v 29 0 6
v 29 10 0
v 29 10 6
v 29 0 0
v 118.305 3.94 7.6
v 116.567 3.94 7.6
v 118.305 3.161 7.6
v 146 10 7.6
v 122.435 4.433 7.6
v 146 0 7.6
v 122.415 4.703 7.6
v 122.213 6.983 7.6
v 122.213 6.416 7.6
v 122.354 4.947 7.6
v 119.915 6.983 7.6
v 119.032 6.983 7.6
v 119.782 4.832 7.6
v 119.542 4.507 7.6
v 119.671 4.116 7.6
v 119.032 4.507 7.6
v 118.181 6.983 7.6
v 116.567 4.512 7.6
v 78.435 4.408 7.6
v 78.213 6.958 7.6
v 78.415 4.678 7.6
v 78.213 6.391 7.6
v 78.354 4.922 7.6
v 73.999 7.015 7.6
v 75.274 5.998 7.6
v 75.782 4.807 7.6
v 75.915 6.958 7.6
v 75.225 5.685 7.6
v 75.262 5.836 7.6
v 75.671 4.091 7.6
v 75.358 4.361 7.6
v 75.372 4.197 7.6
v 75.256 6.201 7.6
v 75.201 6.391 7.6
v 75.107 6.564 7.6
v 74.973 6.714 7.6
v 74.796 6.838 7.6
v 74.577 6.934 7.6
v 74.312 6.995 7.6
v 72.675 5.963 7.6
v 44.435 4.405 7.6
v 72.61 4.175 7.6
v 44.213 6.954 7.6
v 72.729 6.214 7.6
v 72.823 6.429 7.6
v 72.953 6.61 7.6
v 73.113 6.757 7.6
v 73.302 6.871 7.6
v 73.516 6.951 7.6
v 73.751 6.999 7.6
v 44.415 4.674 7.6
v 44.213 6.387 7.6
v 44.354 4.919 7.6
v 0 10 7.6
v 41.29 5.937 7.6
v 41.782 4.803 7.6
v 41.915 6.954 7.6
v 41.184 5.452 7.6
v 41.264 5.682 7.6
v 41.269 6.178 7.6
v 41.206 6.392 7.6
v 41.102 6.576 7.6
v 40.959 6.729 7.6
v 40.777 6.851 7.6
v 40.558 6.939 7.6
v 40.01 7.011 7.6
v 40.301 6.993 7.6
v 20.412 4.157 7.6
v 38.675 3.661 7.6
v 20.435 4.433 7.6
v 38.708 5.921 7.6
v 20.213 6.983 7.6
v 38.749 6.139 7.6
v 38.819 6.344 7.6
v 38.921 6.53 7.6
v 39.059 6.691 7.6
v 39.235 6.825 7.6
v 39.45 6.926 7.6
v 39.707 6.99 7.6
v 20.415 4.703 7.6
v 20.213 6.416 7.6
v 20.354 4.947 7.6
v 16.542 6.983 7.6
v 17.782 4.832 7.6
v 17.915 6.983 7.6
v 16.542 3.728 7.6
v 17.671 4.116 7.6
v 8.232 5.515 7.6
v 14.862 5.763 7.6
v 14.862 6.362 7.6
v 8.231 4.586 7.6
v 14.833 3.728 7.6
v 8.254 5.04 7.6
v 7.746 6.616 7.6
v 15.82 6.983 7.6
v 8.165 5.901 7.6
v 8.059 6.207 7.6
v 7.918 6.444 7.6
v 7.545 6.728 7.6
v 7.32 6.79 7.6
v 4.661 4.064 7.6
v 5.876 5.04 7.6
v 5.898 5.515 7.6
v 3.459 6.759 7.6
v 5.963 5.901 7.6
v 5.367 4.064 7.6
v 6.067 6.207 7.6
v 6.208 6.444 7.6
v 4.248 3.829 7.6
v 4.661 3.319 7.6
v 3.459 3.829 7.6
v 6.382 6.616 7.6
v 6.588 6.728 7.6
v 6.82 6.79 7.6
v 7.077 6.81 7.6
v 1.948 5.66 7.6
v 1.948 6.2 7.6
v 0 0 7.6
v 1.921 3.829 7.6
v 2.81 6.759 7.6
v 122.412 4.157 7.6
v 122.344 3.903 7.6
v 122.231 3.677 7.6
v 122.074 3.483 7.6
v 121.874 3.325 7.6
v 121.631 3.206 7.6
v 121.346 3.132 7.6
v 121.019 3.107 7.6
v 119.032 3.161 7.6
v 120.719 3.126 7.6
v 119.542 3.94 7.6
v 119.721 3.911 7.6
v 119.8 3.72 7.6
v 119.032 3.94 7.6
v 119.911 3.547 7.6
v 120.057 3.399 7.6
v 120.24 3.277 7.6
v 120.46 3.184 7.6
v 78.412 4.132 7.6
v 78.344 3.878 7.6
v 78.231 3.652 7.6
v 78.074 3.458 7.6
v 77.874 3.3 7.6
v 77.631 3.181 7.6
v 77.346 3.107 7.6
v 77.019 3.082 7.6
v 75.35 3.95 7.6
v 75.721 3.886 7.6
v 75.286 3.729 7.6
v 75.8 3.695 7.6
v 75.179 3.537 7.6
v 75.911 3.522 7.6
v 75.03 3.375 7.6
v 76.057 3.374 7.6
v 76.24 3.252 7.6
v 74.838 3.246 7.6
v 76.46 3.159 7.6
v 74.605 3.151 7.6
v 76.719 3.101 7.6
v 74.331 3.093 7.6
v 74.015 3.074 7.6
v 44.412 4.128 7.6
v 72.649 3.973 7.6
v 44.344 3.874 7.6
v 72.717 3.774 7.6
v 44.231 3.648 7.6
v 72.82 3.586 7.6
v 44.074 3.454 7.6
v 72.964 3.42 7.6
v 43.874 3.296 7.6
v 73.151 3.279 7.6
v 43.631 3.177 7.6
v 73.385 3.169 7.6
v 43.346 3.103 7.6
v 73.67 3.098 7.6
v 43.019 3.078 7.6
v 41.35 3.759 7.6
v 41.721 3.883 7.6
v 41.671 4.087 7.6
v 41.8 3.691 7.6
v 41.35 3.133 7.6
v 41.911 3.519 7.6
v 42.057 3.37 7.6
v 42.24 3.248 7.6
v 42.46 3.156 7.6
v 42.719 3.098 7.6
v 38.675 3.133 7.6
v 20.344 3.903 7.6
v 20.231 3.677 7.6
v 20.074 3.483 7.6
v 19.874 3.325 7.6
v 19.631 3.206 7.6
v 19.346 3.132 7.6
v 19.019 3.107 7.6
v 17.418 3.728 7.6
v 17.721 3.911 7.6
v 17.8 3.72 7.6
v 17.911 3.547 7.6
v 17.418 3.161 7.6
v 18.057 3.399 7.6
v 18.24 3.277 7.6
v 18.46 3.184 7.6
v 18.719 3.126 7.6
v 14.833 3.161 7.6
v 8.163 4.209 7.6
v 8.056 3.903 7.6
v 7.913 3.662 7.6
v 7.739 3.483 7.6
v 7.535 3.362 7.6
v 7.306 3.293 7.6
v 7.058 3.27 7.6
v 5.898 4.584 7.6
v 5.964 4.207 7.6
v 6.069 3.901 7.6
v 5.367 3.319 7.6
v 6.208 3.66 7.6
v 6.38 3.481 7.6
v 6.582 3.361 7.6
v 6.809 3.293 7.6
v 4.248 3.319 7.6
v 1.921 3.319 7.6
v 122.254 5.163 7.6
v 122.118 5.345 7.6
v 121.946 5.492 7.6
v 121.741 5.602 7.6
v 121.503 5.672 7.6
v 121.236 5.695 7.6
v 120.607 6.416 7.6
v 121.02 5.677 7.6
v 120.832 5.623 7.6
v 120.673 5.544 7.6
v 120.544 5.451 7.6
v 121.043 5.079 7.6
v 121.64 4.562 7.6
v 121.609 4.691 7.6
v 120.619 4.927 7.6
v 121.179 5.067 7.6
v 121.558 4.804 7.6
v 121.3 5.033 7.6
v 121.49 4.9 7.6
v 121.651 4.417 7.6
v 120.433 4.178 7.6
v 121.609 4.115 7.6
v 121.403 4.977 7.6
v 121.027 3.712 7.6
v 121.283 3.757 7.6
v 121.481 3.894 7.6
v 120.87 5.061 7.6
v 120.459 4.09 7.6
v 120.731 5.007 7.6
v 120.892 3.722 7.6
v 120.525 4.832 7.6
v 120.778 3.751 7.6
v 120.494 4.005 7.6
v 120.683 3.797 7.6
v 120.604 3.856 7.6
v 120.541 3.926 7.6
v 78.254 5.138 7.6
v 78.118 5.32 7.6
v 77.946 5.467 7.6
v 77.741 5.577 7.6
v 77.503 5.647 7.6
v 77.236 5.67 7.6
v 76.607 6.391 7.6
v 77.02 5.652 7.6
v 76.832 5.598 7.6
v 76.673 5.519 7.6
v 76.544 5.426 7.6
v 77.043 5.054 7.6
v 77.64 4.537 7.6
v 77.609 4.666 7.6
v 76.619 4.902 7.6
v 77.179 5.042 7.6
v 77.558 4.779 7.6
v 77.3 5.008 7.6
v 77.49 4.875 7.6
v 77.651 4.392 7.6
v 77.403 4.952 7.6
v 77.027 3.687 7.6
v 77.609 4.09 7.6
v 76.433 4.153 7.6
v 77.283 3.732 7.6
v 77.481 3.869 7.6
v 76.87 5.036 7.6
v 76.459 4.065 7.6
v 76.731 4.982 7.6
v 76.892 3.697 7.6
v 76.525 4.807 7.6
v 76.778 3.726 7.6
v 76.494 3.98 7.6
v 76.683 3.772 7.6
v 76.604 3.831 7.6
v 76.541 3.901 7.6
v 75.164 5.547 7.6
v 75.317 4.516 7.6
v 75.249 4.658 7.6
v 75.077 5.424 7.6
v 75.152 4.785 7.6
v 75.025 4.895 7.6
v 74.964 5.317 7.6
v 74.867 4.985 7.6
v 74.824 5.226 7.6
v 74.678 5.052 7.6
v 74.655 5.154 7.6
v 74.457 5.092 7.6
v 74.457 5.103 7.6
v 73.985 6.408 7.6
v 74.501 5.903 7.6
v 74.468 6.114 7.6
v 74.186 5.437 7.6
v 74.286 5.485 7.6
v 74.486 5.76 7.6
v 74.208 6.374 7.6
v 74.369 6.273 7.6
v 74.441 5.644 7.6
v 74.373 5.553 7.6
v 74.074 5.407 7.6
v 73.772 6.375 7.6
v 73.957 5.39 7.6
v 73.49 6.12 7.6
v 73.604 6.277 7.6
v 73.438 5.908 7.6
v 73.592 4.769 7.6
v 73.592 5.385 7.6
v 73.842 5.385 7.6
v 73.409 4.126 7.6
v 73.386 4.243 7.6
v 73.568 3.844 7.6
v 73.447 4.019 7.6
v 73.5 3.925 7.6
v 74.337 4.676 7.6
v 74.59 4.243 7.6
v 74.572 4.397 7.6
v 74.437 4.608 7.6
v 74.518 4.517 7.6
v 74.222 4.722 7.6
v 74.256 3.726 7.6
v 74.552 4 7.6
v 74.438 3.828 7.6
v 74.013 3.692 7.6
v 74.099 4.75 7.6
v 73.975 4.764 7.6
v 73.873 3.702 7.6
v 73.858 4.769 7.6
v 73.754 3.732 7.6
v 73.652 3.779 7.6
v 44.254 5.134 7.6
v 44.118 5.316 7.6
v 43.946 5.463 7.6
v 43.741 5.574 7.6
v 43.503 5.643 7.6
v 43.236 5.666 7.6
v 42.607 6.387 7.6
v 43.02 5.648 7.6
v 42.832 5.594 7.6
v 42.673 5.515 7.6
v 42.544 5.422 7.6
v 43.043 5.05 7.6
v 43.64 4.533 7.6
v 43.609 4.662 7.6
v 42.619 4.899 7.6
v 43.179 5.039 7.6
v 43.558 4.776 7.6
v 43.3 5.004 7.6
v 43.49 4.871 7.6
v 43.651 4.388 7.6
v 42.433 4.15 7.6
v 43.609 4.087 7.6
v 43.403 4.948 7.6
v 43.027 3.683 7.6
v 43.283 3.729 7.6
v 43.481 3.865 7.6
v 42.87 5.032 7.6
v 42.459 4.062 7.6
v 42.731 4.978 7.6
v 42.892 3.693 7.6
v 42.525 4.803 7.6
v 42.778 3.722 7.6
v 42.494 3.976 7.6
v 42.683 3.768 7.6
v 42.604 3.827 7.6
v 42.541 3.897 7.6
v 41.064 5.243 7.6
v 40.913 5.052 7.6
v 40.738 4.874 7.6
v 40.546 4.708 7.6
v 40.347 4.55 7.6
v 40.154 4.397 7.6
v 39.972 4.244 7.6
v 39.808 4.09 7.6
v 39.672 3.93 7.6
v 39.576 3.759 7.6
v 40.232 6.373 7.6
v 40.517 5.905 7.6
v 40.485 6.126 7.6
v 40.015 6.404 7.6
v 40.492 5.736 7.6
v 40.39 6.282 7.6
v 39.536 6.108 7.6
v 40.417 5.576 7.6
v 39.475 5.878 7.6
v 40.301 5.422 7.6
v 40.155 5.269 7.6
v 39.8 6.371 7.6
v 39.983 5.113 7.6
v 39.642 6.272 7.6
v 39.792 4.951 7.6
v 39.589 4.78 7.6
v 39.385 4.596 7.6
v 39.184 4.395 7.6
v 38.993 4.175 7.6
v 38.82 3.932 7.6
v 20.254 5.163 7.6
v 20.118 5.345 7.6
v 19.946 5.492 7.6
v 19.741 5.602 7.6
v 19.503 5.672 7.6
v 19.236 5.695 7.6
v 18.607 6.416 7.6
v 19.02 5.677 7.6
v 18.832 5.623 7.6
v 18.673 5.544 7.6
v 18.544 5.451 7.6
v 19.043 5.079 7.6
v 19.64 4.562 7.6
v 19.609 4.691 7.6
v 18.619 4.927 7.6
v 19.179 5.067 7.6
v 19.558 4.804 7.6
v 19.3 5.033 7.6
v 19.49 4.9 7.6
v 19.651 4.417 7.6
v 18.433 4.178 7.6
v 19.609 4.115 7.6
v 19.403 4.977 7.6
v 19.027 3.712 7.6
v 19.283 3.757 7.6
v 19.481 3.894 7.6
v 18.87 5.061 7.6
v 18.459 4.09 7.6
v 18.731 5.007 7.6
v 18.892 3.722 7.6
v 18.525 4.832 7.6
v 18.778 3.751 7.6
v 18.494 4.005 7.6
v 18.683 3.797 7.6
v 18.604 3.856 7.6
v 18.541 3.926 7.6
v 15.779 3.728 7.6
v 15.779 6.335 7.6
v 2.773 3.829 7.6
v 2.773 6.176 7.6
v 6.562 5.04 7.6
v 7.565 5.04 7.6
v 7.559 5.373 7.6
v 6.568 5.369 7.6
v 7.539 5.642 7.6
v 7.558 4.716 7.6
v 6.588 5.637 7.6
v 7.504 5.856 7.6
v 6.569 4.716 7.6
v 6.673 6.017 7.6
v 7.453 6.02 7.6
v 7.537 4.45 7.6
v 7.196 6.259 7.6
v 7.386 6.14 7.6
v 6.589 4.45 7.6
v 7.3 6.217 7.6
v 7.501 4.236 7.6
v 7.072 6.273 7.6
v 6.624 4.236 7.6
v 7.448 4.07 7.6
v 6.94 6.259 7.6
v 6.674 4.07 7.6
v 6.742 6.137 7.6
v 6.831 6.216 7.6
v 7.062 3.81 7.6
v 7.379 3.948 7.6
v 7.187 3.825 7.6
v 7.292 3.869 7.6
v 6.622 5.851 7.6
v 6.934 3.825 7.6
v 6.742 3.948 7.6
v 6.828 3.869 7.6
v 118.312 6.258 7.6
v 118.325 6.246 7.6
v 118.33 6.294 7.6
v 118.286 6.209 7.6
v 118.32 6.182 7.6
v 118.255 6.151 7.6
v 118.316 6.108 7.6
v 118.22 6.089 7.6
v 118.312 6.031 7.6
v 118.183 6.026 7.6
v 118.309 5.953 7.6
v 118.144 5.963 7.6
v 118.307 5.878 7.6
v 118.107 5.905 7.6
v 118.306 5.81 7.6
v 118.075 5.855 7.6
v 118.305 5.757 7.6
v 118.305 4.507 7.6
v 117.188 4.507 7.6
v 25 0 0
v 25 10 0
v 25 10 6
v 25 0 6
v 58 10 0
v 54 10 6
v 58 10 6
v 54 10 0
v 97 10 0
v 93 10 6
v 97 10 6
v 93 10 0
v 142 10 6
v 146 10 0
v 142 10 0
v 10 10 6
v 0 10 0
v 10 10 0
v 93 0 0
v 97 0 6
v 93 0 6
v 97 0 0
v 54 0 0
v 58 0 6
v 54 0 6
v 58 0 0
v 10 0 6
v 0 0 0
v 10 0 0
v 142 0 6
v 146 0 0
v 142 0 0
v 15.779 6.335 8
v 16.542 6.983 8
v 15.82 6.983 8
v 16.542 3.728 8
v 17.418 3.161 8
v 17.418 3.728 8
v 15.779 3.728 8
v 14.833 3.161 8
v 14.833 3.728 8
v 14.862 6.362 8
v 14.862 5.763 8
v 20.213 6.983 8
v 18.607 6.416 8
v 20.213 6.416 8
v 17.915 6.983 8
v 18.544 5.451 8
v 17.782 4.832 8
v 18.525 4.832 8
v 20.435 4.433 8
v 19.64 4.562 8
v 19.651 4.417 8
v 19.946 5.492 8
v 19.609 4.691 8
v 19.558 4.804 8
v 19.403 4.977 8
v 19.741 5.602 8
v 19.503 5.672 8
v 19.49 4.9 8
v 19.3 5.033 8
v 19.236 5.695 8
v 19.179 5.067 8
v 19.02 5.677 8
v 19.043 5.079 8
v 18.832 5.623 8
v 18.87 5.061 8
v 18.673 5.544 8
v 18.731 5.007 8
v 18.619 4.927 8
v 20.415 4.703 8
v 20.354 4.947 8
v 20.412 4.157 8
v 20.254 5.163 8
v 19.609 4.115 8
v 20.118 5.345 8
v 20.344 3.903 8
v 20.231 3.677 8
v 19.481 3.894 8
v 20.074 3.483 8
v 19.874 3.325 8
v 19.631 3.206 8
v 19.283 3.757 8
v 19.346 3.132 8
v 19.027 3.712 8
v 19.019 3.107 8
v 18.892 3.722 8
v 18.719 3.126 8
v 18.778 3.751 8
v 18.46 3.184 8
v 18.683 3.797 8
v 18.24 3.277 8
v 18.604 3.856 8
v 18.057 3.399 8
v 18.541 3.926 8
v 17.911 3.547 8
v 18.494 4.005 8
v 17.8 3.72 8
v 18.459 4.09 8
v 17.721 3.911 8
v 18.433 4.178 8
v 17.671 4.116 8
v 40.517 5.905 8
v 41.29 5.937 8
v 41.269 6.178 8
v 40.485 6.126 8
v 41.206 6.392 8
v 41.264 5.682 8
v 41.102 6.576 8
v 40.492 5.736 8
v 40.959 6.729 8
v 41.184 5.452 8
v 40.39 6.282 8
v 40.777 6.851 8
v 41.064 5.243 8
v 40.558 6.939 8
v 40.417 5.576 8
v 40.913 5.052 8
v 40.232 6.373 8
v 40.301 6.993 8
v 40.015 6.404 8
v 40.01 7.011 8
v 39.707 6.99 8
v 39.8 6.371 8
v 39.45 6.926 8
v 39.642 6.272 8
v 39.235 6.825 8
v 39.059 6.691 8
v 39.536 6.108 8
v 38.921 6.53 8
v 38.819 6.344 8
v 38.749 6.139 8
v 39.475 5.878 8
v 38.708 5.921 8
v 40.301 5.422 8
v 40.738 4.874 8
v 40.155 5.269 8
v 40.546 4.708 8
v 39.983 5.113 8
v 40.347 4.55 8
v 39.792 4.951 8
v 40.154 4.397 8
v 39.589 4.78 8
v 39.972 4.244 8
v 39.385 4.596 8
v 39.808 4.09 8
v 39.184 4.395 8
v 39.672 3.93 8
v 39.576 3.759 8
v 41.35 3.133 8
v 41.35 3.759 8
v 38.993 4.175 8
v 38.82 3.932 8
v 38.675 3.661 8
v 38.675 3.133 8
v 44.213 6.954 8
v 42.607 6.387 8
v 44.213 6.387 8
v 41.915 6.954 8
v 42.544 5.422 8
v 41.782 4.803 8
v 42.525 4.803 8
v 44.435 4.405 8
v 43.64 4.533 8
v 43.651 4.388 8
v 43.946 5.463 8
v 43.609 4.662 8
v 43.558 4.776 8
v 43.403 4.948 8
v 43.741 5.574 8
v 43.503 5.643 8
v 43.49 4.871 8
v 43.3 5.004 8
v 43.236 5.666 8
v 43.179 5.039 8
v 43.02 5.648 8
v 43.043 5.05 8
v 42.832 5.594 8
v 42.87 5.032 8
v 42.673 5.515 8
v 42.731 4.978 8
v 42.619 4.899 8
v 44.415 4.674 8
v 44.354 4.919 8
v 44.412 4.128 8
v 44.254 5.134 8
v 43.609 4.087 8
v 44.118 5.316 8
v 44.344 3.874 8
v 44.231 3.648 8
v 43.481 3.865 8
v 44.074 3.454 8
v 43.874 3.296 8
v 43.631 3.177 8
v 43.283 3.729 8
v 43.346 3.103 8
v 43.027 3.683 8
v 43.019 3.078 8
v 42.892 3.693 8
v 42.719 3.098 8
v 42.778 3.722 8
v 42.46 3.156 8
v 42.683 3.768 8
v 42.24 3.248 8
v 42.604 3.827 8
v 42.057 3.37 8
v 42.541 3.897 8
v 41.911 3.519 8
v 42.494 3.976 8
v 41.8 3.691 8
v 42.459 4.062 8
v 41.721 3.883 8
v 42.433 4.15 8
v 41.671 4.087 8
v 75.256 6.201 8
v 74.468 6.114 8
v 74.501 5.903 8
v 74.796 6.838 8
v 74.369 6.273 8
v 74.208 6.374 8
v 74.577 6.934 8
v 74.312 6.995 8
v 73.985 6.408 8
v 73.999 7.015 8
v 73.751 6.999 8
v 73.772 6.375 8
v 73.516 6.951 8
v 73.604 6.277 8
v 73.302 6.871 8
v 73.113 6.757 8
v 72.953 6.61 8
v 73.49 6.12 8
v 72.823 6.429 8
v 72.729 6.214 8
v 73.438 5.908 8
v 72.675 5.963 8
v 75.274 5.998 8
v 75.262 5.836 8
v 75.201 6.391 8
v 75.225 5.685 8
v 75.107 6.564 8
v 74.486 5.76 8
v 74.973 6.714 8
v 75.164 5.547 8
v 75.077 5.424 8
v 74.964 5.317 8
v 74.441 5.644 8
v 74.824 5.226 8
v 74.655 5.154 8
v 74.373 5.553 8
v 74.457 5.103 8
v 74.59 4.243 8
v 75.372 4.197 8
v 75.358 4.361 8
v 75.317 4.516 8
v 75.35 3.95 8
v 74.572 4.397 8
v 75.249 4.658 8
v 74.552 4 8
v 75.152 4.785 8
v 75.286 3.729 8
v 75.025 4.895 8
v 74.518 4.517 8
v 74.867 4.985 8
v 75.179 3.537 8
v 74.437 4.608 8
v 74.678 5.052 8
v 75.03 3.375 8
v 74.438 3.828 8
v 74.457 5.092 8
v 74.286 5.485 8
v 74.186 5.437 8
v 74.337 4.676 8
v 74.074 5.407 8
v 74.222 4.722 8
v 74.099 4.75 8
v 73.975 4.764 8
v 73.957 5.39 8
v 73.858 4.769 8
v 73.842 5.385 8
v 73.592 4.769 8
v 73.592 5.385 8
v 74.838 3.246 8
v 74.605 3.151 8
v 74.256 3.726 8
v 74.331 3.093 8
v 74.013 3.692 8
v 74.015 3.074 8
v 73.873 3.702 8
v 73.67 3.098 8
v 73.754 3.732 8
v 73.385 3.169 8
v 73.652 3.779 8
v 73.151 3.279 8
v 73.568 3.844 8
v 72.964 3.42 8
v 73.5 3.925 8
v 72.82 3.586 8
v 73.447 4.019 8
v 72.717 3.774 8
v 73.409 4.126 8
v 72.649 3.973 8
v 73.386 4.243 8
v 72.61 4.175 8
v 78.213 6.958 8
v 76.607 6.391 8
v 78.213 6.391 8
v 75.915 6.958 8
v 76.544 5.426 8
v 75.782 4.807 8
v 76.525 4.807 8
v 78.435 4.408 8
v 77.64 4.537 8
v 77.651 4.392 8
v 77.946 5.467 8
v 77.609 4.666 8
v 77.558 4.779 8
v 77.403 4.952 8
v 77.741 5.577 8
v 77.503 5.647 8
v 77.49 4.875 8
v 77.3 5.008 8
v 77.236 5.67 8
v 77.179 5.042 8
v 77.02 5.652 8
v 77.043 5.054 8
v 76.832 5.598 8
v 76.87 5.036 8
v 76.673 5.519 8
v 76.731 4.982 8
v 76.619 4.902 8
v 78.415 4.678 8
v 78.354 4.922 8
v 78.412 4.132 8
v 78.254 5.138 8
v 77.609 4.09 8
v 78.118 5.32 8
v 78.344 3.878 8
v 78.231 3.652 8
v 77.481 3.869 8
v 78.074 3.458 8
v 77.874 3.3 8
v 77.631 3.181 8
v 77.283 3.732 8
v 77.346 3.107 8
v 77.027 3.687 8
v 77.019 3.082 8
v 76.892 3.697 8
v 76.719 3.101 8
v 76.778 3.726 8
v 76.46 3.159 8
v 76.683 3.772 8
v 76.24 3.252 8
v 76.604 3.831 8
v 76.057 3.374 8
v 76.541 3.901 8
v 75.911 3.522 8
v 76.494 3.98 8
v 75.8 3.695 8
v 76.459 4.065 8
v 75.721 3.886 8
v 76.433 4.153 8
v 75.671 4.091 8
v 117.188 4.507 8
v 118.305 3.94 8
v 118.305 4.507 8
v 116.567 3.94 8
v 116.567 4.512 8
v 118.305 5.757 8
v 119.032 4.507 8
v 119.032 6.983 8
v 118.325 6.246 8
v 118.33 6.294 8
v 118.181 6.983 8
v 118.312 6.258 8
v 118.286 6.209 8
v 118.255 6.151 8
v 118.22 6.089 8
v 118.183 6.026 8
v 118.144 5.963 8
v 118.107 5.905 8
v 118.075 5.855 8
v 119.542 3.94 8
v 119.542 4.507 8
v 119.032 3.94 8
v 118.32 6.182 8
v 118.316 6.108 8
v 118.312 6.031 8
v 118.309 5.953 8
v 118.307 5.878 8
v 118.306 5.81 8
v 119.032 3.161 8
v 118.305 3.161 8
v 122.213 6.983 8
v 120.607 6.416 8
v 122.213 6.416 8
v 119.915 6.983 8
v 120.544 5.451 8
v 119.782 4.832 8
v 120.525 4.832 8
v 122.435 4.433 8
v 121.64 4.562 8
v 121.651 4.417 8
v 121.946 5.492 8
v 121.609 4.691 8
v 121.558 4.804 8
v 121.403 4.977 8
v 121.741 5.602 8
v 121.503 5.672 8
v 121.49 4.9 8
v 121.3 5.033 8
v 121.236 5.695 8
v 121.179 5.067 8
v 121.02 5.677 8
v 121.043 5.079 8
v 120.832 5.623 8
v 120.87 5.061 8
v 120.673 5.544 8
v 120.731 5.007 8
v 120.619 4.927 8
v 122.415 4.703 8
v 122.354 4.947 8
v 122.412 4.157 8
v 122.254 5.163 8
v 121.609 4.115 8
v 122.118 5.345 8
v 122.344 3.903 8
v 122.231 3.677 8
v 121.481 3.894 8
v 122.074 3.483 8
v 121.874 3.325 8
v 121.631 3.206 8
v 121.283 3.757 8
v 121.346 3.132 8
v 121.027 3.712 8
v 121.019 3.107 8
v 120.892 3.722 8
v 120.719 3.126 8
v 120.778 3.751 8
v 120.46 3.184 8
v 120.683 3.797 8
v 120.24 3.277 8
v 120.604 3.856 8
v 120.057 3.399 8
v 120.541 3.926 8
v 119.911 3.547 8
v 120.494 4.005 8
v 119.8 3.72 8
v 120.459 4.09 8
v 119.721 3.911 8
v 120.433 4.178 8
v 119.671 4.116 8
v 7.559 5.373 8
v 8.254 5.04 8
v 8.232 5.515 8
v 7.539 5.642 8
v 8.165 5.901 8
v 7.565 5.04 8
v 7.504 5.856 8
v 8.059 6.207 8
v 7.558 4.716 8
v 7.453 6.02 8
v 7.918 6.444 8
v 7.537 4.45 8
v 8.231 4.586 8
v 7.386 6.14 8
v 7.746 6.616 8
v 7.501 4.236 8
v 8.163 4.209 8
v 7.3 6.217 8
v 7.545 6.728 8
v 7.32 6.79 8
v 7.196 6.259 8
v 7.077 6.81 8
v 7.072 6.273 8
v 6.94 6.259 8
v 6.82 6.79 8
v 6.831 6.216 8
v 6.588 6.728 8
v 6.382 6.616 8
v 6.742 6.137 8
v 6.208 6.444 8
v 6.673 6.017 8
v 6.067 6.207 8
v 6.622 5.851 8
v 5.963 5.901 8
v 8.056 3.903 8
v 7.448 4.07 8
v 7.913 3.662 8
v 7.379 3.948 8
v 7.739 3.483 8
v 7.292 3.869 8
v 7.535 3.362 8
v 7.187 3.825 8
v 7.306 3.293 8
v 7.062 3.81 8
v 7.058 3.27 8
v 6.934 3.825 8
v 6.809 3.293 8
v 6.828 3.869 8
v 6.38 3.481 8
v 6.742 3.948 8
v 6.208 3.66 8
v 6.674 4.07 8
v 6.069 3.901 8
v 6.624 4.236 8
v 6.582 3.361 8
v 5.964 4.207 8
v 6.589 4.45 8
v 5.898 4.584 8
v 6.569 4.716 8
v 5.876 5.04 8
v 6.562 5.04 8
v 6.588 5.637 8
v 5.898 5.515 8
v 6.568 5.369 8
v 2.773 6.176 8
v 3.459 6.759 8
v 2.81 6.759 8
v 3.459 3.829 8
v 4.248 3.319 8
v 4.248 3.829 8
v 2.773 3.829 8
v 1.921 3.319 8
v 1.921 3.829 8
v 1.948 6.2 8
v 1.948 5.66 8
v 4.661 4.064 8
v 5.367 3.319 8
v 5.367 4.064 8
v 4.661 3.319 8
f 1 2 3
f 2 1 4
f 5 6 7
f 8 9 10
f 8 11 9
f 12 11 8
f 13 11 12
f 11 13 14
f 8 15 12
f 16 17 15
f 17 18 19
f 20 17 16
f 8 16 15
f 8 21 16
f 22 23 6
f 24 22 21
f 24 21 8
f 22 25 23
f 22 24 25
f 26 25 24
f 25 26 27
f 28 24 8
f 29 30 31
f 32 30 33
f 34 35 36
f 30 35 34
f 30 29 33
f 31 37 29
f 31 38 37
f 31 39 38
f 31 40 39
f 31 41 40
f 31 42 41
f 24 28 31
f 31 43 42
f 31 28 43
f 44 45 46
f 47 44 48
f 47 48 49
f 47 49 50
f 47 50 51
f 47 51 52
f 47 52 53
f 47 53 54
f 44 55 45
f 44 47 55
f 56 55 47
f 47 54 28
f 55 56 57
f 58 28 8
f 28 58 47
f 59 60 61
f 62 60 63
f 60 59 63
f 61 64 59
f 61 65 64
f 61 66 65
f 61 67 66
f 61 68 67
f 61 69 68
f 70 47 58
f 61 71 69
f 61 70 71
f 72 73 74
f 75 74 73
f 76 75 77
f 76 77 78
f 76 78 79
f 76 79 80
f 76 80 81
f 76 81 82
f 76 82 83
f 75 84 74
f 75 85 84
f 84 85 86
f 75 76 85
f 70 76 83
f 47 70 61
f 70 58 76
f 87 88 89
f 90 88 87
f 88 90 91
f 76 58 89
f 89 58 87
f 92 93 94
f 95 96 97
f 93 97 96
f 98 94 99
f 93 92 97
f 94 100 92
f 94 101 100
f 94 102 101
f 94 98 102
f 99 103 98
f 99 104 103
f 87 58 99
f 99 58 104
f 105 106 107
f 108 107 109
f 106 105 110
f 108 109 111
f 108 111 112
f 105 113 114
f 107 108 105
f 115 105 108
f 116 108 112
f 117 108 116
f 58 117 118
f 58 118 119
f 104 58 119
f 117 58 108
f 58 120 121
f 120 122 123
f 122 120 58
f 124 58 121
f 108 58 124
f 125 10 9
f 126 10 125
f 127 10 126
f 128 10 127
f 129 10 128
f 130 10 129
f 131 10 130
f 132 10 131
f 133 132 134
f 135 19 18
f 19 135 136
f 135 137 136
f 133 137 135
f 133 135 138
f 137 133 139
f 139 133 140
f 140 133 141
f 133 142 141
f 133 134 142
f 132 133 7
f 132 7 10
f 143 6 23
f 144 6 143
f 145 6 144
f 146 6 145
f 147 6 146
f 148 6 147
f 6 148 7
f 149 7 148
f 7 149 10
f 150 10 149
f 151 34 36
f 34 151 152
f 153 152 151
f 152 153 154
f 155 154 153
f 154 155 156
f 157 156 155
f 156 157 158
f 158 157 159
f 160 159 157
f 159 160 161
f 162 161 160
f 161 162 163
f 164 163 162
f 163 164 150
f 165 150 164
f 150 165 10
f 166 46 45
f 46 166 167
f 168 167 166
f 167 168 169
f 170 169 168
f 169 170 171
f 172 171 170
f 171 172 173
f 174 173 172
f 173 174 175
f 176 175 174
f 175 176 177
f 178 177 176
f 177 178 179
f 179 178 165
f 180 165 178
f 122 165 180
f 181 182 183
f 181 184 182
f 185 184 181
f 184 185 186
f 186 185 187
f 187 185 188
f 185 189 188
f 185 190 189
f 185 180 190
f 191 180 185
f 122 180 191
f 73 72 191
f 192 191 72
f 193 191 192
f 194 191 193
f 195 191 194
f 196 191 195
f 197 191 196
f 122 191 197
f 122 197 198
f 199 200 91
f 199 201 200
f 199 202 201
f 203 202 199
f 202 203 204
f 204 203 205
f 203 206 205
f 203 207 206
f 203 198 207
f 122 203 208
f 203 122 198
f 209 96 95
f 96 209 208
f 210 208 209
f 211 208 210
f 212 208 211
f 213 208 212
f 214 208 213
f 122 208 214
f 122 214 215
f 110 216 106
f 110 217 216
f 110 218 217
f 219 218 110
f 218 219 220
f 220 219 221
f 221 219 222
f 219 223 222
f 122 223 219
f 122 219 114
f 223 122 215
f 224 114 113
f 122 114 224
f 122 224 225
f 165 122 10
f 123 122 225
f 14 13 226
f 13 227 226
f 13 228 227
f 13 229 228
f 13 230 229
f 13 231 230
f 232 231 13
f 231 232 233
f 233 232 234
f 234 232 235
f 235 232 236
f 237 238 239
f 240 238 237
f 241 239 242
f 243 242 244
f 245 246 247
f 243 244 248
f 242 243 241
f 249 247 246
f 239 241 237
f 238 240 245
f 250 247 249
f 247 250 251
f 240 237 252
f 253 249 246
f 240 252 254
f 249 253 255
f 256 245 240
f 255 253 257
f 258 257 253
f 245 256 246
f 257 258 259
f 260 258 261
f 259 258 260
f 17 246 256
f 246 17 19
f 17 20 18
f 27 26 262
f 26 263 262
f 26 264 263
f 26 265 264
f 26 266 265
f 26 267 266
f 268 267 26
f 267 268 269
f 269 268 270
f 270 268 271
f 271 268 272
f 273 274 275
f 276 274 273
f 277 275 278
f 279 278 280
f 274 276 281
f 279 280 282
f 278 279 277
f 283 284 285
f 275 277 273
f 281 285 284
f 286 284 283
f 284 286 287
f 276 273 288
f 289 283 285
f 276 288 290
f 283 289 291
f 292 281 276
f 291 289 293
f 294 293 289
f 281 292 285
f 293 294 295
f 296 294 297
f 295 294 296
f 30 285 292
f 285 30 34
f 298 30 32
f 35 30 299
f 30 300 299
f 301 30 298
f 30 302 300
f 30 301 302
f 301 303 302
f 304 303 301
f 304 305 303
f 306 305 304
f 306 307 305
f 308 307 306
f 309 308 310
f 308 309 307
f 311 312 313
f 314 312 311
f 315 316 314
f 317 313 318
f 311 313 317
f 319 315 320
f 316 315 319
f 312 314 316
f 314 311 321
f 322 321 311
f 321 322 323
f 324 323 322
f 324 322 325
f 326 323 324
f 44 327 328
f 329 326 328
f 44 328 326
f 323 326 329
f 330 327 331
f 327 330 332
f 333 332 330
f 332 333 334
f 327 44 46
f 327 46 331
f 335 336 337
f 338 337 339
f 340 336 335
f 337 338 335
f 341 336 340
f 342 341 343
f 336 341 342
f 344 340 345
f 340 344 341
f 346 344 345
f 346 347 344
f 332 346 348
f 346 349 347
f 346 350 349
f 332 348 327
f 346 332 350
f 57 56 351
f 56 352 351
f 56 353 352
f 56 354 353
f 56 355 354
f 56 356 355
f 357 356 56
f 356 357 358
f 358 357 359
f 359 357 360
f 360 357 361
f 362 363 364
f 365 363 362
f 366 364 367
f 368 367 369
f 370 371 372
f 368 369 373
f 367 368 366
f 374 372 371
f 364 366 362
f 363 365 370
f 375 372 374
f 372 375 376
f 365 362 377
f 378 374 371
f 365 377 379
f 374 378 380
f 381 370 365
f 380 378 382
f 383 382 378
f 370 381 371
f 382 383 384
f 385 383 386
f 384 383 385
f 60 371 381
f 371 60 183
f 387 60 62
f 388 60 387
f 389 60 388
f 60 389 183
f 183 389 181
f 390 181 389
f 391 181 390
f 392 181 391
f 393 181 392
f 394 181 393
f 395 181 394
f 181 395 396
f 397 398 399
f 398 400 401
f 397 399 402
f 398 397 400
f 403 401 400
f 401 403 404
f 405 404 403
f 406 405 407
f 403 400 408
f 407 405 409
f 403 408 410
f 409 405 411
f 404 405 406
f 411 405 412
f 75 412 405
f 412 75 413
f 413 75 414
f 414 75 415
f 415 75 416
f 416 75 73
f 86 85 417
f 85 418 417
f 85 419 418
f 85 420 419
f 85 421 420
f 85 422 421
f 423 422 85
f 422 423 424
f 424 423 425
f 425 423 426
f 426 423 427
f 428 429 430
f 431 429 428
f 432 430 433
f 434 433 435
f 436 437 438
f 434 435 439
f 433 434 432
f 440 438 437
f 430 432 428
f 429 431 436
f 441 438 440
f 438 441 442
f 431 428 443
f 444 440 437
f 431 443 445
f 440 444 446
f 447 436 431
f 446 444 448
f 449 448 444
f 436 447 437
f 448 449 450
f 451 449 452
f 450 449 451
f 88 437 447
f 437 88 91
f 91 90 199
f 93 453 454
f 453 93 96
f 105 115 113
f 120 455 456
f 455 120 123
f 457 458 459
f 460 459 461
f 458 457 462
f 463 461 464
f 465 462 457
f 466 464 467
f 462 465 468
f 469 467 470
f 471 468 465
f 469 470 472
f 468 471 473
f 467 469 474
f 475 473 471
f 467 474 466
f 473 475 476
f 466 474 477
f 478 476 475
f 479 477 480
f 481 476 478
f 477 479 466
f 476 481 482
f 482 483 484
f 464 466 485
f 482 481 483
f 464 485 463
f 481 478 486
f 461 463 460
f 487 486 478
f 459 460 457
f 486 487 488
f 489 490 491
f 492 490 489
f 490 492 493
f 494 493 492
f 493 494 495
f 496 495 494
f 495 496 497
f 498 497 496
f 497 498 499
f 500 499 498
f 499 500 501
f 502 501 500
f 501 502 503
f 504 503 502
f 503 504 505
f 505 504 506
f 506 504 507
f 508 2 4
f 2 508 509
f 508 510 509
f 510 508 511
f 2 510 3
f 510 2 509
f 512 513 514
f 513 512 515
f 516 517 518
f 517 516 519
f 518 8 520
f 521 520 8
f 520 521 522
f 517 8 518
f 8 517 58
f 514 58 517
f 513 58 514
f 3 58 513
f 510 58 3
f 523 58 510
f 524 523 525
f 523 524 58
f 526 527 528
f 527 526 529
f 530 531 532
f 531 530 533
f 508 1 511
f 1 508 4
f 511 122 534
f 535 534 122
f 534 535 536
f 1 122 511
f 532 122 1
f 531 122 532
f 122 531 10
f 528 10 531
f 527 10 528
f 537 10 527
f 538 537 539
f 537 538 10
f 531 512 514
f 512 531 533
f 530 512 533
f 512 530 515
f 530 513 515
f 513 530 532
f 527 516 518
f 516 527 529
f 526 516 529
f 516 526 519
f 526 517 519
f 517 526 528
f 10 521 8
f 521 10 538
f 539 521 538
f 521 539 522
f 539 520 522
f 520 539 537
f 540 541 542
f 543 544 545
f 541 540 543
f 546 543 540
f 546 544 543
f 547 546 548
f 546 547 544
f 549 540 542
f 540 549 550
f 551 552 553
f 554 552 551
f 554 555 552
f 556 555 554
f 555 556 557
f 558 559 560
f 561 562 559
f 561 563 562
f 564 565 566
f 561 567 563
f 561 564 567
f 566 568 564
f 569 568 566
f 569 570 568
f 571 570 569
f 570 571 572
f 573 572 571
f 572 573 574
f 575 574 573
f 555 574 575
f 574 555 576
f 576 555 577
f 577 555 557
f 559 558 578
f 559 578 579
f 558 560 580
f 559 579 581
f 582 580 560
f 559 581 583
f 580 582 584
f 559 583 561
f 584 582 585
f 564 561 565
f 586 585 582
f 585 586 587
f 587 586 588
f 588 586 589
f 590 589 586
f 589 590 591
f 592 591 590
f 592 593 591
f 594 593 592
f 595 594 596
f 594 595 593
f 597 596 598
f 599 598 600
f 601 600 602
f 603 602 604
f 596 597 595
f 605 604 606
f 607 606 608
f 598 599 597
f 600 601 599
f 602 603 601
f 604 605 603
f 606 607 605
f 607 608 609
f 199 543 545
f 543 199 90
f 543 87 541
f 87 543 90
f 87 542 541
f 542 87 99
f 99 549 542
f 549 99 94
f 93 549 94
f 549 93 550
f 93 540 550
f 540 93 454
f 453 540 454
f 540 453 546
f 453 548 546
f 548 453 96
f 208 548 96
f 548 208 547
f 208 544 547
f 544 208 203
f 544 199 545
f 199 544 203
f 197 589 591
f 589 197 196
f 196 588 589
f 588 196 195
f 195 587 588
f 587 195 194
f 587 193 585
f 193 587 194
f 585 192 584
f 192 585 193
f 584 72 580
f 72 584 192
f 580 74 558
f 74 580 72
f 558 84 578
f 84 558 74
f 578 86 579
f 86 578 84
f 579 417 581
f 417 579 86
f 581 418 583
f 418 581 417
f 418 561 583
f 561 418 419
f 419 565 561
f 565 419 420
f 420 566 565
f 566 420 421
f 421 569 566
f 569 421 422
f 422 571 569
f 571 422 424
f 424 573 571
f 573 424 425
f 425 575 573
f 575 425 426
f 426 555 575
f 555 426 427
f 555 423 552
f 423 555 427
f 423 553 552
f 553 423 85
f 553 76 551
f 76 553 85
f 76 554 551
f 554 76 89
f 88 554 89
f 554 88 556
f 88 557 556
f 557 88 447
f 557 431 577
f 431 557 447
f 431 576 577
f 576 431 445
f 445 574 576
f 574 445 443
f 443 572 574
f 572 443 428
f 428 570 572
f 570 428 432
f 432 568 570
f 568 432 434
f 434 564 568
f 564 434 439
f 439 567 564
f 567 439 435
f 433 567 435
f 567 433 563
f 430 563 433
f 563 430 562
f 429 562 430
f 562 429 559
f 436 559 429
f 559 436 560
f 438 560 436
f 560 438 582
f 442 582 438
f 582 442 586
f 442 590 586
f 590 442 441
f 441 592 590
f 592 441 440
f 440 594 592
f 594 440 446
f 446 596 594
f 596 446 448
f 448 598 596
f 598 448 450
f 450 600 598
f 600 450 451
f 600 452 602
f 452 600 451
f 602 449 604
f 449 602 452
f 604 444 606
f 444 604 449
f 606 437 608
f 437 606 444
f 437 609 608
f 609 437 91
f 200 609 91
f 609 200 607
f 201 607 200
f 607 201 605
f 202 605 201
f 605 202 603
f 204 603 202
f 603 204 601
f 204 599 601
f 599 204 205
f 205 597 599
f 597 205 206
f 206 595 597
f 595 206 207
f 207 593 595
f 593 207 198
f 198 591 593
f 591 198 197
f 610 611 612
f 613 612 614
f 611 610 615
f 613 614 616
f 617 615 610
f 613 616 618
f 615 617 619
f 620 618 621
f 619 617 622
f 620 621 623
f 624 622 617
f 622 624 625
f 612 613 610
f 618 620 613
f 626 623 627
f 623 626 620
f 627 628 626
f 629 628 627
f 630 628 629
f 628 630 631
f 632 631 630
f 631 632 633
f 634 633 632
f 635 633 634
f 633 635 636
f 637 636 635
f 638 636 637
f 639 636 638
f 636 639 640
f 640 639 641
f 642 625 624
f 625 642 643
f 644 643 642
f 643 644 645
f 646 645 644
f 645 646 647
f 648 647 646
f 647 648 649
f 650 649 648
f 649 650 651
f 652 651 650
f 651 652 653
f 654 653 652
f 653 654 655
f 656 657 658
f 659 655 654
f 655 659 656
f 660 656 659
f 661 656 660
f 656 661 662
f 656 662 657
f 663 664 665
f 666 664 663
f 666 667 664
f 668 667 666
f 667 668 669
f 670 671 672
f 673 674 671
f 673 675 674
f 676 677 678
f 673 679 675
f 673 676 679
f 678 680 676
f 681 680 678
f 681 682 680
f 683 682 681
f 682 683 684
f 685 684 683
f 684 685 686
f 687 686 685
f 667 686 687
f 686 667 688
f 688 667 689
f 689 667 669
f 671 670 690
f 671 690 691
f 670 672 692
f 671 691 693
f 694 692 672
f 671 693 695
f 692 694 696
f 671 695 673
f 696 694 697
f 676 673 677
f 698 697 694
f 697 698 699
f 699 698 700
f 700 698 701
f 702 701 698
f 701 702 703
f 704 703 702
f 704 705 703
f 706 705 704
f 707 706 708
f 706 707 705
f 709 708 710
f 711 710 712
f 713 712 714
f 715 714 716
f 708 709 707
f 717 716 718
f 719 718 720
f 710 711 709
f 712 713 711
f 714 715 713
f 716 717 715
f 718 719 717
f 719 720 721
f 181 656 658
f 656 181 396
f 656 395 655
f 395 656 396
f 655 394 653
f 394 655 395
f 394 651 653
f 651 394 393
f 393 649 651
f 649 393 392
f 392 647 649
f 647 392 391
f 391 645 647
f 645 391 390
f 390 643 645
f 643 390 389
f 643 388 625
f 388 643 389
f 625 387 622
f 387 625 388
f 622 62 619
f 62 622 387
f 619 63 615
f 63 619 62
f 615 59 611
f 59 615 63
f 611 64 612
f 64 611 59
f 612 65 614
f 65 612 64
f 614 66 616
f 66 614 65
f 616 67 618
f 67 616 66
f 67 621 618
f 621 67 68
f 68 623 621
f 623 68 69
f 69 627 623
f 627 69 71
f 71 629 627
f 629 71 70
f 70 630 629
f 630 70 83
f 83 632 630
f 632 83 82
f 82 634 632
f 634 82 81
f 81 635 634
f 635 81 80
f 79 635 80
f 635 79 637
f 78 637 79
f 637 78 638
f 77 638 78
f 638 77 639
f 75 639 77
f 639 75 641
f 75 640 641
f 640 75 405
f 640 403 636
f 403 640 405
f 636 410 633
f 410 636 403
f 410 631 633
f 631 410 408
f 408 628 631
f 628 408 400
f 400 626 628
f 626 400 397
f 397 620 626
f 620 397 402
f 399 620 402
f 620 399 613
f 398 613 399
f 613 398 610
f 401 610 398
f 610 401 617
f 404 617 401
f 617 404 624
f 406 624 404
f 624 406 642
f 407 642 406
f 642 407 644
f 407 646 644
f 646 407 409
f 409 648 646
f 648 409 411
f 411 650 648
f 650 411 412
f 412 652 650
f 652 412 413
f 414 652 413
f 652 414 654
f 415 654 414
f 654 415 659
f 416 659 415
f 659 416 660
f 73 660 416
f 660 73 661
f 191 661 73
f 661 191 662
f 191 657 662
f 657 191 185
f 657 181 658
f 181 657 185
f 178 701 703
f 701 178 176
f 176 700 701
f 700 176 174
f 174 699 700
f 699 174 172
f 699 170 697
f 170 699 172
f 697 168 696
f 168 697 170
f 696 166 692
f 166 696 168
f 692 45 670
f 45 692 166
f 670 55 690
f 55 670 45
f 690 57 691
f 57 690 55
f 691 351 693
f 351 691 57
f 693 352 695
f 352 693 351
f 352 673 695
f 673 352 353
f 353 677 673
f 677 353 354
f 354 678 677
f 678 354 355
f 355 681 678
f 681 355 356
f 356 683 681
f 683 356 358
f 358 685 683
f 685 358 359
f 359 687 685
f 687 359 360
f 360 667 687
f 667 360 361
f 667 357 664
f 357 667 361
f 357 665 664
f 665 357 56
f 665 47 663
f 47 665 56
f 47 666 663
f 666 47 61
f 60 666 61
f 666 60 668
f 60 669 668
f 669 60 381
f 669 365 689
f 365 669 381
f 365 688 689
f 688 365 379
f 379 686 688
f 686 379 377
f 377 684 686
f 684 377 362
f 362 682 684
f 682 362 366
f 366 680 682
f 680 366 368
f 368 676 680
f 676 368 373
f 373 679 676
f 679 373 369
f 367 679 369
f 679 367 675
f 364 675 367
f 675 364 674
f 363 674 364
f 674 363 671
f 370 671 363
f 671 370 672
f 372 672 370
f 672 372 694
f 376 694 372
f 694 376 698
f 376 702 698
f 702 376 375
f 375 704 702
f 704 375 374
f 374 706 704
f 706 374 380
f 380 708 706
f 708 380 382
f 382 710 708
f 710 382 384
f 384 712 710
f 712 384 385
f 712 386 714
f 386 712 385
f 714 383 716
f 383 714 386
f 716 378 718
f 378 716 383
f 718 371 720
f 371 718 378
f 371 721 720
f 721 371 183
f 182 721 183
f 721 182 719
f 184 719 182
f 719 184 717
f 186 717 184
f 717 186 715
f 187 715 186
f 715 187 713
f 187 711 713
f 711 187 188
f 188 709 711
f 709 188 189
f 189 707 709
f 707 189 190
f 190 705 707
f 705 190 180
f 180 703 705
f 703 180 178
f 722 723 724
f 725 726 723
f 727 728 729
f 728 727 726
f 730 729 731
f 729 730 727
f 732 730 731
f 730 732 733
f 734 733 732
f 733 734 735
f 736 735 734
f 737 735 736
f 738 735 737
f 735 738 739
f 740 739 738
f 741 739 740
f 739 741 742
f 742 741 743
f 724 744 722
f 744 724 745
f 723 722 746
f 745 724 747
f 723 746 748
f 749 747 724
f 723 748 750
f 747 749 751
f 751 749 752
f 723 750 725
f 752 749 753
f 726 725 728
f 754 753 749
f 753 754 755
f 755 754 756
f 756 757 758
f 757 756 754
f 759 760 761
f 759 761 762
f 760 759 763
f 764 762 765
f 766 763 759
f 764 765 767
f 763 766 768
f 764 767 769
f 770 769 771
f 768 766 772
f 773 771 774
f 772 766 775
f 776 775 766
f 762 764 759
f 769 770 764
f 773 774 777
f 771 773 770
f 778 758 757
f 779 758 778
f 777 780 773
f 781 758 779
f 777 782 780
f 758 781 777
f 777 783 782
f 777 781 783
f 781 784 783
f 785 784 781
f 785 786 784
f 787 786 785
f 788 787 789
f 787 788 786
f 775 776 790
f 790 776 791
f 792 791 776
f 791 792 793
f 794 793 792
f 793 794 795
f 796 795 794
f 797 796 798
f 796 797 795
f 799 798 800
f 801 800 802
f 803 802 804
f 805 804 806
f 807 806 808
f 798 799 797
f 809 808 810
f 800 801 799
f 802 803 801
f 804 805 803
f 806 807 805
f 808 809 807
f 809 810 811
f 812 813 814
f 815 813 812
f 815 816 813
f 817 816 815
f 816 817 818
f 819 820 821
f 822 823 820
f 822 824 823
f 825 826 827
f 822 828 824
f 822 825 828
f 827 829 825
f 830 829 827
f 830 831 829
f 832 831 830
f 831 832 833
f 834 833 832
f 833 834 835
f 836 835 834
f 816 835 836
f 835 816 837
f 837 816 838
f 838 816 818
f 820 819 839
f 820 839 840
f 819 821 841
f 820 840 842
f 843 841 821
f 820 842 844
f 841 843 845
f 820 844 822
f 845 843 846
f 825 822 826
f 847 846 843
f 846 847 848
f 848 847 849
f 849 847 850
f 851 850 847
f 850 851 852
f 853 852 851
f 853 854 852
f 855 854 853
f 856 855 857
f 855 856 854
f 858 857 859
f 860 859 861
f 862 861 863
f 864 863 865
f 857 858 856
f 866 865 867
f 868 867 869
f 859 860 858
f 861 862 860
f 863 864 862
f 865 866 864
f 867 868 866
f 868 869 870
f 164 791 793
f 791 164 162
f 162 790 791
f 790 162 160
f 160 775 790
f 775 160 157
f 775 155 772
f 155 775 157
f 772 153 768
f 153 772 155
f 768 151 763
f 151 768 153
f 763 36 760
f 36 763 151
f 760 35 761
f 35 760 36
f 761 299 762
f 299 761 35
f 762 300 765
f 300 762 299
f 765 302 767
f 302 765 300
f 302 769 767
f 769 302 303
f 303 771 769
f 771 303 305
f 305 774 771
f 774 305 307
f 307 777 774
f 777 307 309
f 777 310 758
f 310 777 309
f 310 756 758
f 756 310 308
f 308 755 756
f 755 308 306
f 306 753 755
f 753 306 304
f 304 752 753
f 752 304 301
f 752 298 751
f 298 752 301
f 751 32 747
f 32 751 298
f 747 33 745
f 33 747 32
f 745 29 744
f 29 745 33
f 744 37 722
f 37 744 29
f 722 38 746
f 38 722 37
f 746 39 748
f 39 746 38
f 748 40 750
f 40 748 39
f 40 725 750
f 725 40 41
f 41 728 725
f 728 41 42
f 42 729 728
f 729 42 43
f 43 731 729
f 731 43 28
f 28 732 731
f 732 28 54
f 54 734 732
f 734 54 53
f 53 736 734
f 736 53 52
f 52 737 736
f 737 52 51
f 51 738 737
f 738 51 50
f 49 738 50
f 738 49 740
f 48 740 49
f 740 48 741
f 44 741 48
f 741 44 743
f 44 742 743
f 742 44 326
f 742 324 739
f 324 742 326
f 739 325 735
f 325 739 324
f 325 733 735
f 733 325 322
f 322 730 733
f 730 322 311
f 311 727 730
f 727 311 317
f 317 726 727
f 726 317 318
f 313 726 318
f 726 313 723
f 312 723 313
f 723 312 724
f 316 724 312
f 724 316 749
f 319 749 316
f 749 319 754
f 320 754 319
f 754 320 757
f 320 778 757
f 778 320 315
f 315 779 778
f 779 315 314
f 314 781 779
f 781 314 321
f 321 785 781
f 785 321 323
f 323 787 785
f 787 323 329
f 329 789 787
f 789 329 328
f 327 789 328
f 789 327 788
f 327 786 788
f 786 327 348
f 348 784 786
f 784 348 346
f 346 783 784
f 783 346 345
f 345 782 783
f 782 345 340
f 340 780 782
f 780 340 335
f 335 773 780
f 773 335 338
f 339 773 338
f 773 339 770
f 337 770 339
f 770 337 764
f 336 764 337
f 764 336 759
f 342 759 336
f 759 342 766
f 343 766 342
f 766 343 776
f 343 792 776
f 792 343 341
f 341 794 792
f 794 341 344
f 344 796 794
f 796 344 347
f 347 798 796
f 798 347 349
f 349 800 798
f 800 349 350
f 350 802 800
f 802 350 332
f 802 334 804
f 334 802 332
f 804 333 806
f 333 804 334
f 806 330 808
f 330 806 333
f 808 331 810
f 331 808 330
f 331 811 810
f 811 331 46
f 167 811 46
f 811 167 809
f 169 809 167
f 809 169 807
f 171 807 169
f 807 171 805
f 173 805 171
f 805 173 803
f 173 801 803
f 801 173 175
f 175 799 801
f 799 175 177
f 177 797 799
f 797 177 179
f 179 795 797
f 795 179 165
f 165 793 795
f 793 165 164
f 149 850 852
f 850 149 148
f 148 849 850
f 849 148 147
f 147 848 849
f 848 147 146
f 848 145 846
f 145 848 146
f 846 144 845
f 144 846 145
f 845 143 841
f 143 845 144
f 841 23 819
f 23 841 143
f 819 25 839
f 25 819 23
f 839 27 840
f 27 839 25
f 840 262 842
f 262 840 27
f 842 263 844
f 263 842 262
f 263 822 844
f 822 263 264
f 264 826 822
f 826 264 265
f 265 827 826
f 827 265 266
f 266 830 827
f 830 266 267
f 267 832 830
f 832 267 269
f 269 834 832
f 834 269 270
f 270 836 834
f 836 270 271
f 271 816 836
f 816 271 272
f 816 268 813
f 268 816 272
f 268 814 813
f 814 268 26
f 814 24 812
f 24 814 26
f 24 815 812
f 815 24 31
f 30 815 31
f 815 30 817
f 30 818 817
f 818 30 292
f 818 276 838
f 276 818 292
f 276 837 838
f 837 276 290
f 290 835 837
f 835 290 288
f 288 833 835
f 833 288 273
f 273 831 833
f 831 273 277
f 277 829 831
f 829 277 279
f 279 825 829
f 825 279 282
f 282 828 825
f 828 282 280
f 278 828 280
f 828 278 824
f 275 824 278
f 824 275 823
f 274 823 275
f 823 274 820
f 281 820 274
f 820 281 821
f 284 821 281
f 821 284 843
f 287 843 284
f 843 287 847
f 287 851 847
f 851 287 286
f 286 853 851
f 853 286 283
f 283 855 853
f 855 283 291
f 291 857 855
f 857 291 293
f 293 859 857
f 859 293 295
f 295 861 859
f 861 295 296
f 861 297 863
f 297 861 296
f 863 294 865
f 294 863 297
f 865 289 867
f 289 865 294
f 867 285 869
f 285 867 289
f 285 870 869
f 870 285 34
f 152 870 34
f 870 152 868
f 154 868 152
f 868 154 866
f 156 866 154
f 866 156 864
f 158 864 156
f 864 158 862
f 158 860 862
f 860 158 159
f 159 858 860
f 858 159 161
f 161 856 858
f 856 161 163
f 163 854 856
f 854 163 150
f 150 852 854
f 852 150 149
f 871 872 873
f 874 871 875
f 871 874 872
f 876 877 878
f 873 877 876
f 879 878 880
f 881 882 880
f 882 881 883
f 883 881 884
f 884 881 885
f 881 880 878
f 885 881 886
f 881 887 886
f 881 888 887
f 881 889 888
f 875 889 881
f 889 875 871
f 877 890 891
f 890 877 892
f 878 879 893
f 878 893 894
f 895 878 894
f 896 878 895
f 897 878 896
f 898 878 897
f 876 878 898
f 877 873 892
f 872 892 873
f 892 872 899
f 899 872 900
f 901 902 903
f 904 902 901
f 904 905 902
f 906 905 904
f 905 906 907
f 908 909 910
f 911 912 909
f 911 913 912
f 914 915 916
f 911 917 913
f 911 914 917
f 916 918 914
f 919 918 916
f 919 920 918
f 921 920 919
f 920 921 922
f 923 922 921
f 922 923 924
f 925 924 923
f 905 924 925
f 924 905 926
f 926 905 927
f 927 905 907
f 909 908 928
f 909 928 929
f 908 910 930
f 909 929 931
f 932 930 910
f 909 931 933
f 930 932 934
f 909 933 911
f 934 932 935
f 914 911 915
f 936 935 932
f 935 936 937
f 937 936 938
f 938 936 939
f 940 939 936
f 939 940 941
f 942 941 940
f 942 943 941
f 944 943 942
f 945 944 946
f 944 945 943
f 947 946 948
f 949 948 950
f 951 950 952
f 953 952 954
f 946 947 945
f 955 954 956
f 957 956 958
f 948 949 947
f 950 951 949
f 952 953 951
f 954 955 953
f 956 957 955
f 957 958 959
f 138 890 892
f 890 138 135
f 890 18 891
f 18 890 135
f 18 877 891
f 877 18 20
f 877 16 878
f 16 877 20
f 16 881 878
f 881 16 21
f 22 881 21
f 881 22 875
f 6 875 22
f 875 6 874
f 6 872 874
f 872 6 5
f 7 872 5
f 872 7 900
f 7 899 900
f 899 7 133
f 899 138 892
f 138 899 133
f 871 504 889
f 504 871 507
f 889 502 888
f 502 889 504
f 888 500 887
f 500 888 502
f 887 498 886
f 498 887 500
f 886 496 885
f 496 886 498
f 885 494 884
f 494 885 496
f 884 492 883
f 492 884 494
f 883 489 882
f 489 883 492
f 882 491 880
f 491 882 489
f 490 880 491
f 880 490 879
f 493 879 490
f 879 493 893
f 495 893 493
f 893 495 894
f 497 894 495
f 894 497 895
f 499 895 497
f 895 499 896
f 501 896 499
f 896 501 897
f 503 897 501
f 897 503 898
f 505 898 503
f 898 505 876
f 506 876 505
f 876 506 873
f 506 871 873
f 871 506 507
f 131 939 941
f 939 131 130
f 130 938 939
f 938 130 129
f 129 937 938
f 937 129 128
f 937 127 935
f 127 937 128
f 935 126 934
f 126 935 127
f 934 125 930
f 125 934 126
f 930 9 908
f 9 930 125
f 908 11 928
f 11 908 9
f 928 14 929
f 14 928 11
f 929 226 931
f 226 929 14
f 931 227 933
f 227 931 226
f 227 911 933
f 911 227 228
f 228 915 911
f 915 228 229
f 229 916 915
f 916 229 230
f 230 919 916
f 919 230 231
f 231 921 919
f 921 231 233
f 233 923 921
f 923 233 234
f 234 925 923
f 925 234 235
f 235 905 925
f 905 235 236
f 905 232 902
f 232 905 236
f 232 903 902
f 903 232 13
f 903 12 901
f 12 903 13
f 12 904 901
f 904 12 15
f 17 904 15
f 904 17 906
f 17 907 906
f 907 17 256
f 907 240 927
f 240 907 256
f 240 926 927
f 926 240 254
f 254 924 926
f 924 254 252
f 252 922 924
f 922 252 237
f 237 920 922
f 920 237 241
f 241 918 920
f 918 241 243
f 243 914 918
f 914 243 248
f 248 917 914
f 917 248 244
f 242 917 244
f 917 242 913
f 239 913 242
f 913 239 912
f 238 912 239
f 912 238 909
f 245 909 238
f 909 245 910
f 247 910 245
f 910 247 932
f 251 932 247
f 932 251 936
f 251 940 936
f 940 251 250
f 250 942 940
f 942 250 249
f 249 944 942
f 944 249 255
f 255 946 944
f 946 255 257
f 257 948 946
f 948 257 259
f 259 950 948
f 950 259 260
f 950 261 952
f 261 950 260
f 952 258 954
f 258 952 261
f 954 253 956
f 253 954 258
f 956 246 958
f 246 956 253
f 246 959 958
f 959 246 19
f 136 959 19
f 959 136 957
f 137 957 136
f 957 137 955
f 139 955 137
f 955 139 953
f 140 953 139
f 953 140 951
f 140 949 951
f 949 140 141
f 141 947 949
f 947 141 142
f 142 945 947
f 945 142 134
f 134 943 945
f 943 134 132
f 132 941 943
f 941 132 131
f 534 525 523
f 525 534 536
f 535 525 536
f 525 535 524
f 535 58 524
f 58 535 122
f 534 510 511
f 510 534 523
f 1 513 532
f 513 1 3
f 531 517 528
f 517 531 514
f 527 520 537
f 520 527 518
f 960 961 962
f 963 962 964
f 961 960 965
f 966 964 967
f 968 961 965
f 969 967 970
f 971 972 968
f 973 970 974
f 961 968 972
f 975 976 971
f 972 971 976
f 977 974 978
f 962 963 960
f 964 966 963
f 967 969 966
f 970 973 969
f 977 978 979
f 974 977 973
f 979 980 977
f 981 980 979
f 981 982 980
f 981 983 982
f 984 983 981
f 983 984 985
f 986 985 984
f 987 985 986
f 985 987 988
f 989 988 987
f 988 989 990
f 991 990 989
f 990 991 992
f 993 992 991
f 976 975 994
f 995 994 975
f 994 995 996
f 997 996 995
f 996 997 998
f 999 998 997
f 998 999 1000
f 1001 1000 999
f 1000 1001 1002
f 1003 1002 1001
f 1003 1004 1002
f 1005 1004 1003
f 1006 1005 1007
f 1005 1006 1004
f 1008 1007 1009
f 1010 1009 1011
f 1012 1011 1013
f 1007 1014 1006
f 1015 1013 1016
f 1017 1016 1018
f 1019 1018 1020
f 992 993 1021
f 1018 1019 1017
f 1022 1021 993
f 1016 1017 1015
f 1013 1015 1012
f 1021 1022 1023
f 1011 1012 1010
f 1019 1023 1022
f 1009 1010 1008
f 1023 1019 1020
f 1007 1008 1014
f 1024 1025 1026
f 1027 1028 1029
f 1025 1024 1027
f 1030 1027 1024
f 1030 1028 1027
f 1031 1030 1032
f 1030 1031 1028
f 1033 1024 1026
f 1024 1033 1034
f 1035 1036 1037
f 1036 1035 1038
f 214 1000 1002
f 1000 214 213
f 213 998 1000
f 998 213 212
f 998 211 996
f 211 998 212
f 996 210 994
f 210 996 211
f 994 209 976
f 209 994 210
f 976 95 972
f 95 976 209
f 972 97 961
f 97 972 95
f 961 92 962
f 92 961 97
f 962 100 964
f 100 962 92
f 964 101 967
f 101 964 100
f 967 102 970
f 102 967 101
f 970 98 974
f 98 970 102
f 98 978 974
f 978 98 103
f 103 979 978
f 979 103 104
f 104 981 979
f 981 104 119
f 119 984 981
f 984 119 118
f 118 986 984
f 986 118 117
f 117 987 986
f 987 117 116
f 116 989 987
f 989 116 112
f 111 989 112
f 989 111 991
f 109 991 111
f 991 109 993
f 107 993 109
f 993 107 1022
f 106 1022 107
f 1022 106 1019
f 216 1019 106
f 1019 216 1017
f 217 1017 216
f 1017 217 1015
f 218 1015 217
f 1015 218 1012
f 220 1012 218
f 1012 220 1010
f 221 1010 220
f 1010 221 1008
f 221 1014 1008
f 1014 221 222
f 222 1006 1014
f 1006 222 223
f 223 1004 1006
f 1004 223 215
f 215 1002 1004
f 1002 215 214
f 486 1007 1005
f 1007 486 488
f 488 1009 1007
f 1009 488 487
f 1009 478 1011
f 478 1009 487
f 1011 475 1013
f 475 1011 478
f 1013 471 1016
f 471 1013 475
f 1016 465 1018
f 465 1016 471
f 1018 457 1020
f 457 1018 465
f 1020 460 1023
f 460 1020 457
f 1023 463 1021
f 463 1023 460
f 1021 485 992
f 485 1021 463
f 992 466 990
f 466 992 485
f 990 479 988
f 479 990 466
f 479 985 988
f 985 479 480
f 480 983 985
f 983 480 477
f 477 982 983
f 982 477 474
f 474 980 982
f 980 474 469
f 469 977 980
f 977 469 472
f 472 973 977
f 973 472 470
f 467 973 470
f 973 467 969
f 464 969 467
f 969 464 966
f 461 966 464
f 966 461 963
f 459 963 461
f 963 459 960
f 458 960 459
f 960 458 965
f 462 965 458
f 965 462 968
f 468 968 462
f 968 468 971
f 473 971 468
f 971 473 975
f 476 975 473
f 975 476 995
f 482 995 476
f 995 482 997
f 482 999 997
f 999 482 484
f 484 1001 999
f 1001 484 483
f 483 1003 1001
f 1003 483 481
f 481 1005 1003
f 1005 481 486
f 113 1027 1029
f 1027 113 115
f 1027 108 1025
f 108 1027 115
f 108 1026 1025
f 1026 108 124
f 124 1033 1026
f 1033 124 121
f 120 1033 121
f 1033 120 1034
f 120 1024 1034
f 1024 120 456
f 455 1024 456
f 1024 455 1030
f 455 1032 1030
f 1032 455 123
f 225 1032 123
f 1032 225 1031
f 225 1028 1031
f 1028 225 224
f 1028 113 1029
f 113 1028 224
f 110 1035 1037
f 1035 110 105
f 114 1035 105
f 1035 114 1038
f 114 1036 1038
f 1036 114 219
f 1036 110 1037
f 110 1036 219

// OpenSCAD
// Bridge row: a deck 10 mm wide over spans 15 / 25 / 35 / 45 mm, underside at z = 6, 1.6 mm thick (8 layers at 0.2).
// Span lengths are raised on the deck, the row label (its bridge_flow) on the left tab.
label = "1.0";

spans = [15, 25, 35, 45];
tab = 10;        // left block under the label
post = 4;        // pillar width along the bridge
w = 10;          // deck / pillar width (y)
under = 6;       // deck underside above the bed
deck = 1.6;

function x0(i) = tab + post * i + (i == 0 ? 0 : spans[0]) + (i > 1 ? spans[1] : 0) + (i > 2 ? spans[2] : 0);   // start of span i
total = tab + post * 3 + spans[0] + spans[1] + spans[2] + spans[3] + post;

cube([tab, w, under + deck]);
for (i = [0 : 3]) translate([x0(i) + spans[i], 0, 0]) cube([post, w, under + deck]);
translate([0, 0, under]) cube([total, w, deck]);
translate([tab / 2, w / 2, under + deck]) linear_extrude(0.4)
    text(label, size = 3.6, font = "Liberation Sans:style=Bold", halign = "center", valign = "center");
for (i = [0 : 3]) translate([x0(i) + spans[i] / 2, w / 2, under + deck]) linear_extrude(0.4)
    text(str(spans[i]), size = 4, font = "Liberation Sans:style=Bold", halign = "center", valign = "center");
